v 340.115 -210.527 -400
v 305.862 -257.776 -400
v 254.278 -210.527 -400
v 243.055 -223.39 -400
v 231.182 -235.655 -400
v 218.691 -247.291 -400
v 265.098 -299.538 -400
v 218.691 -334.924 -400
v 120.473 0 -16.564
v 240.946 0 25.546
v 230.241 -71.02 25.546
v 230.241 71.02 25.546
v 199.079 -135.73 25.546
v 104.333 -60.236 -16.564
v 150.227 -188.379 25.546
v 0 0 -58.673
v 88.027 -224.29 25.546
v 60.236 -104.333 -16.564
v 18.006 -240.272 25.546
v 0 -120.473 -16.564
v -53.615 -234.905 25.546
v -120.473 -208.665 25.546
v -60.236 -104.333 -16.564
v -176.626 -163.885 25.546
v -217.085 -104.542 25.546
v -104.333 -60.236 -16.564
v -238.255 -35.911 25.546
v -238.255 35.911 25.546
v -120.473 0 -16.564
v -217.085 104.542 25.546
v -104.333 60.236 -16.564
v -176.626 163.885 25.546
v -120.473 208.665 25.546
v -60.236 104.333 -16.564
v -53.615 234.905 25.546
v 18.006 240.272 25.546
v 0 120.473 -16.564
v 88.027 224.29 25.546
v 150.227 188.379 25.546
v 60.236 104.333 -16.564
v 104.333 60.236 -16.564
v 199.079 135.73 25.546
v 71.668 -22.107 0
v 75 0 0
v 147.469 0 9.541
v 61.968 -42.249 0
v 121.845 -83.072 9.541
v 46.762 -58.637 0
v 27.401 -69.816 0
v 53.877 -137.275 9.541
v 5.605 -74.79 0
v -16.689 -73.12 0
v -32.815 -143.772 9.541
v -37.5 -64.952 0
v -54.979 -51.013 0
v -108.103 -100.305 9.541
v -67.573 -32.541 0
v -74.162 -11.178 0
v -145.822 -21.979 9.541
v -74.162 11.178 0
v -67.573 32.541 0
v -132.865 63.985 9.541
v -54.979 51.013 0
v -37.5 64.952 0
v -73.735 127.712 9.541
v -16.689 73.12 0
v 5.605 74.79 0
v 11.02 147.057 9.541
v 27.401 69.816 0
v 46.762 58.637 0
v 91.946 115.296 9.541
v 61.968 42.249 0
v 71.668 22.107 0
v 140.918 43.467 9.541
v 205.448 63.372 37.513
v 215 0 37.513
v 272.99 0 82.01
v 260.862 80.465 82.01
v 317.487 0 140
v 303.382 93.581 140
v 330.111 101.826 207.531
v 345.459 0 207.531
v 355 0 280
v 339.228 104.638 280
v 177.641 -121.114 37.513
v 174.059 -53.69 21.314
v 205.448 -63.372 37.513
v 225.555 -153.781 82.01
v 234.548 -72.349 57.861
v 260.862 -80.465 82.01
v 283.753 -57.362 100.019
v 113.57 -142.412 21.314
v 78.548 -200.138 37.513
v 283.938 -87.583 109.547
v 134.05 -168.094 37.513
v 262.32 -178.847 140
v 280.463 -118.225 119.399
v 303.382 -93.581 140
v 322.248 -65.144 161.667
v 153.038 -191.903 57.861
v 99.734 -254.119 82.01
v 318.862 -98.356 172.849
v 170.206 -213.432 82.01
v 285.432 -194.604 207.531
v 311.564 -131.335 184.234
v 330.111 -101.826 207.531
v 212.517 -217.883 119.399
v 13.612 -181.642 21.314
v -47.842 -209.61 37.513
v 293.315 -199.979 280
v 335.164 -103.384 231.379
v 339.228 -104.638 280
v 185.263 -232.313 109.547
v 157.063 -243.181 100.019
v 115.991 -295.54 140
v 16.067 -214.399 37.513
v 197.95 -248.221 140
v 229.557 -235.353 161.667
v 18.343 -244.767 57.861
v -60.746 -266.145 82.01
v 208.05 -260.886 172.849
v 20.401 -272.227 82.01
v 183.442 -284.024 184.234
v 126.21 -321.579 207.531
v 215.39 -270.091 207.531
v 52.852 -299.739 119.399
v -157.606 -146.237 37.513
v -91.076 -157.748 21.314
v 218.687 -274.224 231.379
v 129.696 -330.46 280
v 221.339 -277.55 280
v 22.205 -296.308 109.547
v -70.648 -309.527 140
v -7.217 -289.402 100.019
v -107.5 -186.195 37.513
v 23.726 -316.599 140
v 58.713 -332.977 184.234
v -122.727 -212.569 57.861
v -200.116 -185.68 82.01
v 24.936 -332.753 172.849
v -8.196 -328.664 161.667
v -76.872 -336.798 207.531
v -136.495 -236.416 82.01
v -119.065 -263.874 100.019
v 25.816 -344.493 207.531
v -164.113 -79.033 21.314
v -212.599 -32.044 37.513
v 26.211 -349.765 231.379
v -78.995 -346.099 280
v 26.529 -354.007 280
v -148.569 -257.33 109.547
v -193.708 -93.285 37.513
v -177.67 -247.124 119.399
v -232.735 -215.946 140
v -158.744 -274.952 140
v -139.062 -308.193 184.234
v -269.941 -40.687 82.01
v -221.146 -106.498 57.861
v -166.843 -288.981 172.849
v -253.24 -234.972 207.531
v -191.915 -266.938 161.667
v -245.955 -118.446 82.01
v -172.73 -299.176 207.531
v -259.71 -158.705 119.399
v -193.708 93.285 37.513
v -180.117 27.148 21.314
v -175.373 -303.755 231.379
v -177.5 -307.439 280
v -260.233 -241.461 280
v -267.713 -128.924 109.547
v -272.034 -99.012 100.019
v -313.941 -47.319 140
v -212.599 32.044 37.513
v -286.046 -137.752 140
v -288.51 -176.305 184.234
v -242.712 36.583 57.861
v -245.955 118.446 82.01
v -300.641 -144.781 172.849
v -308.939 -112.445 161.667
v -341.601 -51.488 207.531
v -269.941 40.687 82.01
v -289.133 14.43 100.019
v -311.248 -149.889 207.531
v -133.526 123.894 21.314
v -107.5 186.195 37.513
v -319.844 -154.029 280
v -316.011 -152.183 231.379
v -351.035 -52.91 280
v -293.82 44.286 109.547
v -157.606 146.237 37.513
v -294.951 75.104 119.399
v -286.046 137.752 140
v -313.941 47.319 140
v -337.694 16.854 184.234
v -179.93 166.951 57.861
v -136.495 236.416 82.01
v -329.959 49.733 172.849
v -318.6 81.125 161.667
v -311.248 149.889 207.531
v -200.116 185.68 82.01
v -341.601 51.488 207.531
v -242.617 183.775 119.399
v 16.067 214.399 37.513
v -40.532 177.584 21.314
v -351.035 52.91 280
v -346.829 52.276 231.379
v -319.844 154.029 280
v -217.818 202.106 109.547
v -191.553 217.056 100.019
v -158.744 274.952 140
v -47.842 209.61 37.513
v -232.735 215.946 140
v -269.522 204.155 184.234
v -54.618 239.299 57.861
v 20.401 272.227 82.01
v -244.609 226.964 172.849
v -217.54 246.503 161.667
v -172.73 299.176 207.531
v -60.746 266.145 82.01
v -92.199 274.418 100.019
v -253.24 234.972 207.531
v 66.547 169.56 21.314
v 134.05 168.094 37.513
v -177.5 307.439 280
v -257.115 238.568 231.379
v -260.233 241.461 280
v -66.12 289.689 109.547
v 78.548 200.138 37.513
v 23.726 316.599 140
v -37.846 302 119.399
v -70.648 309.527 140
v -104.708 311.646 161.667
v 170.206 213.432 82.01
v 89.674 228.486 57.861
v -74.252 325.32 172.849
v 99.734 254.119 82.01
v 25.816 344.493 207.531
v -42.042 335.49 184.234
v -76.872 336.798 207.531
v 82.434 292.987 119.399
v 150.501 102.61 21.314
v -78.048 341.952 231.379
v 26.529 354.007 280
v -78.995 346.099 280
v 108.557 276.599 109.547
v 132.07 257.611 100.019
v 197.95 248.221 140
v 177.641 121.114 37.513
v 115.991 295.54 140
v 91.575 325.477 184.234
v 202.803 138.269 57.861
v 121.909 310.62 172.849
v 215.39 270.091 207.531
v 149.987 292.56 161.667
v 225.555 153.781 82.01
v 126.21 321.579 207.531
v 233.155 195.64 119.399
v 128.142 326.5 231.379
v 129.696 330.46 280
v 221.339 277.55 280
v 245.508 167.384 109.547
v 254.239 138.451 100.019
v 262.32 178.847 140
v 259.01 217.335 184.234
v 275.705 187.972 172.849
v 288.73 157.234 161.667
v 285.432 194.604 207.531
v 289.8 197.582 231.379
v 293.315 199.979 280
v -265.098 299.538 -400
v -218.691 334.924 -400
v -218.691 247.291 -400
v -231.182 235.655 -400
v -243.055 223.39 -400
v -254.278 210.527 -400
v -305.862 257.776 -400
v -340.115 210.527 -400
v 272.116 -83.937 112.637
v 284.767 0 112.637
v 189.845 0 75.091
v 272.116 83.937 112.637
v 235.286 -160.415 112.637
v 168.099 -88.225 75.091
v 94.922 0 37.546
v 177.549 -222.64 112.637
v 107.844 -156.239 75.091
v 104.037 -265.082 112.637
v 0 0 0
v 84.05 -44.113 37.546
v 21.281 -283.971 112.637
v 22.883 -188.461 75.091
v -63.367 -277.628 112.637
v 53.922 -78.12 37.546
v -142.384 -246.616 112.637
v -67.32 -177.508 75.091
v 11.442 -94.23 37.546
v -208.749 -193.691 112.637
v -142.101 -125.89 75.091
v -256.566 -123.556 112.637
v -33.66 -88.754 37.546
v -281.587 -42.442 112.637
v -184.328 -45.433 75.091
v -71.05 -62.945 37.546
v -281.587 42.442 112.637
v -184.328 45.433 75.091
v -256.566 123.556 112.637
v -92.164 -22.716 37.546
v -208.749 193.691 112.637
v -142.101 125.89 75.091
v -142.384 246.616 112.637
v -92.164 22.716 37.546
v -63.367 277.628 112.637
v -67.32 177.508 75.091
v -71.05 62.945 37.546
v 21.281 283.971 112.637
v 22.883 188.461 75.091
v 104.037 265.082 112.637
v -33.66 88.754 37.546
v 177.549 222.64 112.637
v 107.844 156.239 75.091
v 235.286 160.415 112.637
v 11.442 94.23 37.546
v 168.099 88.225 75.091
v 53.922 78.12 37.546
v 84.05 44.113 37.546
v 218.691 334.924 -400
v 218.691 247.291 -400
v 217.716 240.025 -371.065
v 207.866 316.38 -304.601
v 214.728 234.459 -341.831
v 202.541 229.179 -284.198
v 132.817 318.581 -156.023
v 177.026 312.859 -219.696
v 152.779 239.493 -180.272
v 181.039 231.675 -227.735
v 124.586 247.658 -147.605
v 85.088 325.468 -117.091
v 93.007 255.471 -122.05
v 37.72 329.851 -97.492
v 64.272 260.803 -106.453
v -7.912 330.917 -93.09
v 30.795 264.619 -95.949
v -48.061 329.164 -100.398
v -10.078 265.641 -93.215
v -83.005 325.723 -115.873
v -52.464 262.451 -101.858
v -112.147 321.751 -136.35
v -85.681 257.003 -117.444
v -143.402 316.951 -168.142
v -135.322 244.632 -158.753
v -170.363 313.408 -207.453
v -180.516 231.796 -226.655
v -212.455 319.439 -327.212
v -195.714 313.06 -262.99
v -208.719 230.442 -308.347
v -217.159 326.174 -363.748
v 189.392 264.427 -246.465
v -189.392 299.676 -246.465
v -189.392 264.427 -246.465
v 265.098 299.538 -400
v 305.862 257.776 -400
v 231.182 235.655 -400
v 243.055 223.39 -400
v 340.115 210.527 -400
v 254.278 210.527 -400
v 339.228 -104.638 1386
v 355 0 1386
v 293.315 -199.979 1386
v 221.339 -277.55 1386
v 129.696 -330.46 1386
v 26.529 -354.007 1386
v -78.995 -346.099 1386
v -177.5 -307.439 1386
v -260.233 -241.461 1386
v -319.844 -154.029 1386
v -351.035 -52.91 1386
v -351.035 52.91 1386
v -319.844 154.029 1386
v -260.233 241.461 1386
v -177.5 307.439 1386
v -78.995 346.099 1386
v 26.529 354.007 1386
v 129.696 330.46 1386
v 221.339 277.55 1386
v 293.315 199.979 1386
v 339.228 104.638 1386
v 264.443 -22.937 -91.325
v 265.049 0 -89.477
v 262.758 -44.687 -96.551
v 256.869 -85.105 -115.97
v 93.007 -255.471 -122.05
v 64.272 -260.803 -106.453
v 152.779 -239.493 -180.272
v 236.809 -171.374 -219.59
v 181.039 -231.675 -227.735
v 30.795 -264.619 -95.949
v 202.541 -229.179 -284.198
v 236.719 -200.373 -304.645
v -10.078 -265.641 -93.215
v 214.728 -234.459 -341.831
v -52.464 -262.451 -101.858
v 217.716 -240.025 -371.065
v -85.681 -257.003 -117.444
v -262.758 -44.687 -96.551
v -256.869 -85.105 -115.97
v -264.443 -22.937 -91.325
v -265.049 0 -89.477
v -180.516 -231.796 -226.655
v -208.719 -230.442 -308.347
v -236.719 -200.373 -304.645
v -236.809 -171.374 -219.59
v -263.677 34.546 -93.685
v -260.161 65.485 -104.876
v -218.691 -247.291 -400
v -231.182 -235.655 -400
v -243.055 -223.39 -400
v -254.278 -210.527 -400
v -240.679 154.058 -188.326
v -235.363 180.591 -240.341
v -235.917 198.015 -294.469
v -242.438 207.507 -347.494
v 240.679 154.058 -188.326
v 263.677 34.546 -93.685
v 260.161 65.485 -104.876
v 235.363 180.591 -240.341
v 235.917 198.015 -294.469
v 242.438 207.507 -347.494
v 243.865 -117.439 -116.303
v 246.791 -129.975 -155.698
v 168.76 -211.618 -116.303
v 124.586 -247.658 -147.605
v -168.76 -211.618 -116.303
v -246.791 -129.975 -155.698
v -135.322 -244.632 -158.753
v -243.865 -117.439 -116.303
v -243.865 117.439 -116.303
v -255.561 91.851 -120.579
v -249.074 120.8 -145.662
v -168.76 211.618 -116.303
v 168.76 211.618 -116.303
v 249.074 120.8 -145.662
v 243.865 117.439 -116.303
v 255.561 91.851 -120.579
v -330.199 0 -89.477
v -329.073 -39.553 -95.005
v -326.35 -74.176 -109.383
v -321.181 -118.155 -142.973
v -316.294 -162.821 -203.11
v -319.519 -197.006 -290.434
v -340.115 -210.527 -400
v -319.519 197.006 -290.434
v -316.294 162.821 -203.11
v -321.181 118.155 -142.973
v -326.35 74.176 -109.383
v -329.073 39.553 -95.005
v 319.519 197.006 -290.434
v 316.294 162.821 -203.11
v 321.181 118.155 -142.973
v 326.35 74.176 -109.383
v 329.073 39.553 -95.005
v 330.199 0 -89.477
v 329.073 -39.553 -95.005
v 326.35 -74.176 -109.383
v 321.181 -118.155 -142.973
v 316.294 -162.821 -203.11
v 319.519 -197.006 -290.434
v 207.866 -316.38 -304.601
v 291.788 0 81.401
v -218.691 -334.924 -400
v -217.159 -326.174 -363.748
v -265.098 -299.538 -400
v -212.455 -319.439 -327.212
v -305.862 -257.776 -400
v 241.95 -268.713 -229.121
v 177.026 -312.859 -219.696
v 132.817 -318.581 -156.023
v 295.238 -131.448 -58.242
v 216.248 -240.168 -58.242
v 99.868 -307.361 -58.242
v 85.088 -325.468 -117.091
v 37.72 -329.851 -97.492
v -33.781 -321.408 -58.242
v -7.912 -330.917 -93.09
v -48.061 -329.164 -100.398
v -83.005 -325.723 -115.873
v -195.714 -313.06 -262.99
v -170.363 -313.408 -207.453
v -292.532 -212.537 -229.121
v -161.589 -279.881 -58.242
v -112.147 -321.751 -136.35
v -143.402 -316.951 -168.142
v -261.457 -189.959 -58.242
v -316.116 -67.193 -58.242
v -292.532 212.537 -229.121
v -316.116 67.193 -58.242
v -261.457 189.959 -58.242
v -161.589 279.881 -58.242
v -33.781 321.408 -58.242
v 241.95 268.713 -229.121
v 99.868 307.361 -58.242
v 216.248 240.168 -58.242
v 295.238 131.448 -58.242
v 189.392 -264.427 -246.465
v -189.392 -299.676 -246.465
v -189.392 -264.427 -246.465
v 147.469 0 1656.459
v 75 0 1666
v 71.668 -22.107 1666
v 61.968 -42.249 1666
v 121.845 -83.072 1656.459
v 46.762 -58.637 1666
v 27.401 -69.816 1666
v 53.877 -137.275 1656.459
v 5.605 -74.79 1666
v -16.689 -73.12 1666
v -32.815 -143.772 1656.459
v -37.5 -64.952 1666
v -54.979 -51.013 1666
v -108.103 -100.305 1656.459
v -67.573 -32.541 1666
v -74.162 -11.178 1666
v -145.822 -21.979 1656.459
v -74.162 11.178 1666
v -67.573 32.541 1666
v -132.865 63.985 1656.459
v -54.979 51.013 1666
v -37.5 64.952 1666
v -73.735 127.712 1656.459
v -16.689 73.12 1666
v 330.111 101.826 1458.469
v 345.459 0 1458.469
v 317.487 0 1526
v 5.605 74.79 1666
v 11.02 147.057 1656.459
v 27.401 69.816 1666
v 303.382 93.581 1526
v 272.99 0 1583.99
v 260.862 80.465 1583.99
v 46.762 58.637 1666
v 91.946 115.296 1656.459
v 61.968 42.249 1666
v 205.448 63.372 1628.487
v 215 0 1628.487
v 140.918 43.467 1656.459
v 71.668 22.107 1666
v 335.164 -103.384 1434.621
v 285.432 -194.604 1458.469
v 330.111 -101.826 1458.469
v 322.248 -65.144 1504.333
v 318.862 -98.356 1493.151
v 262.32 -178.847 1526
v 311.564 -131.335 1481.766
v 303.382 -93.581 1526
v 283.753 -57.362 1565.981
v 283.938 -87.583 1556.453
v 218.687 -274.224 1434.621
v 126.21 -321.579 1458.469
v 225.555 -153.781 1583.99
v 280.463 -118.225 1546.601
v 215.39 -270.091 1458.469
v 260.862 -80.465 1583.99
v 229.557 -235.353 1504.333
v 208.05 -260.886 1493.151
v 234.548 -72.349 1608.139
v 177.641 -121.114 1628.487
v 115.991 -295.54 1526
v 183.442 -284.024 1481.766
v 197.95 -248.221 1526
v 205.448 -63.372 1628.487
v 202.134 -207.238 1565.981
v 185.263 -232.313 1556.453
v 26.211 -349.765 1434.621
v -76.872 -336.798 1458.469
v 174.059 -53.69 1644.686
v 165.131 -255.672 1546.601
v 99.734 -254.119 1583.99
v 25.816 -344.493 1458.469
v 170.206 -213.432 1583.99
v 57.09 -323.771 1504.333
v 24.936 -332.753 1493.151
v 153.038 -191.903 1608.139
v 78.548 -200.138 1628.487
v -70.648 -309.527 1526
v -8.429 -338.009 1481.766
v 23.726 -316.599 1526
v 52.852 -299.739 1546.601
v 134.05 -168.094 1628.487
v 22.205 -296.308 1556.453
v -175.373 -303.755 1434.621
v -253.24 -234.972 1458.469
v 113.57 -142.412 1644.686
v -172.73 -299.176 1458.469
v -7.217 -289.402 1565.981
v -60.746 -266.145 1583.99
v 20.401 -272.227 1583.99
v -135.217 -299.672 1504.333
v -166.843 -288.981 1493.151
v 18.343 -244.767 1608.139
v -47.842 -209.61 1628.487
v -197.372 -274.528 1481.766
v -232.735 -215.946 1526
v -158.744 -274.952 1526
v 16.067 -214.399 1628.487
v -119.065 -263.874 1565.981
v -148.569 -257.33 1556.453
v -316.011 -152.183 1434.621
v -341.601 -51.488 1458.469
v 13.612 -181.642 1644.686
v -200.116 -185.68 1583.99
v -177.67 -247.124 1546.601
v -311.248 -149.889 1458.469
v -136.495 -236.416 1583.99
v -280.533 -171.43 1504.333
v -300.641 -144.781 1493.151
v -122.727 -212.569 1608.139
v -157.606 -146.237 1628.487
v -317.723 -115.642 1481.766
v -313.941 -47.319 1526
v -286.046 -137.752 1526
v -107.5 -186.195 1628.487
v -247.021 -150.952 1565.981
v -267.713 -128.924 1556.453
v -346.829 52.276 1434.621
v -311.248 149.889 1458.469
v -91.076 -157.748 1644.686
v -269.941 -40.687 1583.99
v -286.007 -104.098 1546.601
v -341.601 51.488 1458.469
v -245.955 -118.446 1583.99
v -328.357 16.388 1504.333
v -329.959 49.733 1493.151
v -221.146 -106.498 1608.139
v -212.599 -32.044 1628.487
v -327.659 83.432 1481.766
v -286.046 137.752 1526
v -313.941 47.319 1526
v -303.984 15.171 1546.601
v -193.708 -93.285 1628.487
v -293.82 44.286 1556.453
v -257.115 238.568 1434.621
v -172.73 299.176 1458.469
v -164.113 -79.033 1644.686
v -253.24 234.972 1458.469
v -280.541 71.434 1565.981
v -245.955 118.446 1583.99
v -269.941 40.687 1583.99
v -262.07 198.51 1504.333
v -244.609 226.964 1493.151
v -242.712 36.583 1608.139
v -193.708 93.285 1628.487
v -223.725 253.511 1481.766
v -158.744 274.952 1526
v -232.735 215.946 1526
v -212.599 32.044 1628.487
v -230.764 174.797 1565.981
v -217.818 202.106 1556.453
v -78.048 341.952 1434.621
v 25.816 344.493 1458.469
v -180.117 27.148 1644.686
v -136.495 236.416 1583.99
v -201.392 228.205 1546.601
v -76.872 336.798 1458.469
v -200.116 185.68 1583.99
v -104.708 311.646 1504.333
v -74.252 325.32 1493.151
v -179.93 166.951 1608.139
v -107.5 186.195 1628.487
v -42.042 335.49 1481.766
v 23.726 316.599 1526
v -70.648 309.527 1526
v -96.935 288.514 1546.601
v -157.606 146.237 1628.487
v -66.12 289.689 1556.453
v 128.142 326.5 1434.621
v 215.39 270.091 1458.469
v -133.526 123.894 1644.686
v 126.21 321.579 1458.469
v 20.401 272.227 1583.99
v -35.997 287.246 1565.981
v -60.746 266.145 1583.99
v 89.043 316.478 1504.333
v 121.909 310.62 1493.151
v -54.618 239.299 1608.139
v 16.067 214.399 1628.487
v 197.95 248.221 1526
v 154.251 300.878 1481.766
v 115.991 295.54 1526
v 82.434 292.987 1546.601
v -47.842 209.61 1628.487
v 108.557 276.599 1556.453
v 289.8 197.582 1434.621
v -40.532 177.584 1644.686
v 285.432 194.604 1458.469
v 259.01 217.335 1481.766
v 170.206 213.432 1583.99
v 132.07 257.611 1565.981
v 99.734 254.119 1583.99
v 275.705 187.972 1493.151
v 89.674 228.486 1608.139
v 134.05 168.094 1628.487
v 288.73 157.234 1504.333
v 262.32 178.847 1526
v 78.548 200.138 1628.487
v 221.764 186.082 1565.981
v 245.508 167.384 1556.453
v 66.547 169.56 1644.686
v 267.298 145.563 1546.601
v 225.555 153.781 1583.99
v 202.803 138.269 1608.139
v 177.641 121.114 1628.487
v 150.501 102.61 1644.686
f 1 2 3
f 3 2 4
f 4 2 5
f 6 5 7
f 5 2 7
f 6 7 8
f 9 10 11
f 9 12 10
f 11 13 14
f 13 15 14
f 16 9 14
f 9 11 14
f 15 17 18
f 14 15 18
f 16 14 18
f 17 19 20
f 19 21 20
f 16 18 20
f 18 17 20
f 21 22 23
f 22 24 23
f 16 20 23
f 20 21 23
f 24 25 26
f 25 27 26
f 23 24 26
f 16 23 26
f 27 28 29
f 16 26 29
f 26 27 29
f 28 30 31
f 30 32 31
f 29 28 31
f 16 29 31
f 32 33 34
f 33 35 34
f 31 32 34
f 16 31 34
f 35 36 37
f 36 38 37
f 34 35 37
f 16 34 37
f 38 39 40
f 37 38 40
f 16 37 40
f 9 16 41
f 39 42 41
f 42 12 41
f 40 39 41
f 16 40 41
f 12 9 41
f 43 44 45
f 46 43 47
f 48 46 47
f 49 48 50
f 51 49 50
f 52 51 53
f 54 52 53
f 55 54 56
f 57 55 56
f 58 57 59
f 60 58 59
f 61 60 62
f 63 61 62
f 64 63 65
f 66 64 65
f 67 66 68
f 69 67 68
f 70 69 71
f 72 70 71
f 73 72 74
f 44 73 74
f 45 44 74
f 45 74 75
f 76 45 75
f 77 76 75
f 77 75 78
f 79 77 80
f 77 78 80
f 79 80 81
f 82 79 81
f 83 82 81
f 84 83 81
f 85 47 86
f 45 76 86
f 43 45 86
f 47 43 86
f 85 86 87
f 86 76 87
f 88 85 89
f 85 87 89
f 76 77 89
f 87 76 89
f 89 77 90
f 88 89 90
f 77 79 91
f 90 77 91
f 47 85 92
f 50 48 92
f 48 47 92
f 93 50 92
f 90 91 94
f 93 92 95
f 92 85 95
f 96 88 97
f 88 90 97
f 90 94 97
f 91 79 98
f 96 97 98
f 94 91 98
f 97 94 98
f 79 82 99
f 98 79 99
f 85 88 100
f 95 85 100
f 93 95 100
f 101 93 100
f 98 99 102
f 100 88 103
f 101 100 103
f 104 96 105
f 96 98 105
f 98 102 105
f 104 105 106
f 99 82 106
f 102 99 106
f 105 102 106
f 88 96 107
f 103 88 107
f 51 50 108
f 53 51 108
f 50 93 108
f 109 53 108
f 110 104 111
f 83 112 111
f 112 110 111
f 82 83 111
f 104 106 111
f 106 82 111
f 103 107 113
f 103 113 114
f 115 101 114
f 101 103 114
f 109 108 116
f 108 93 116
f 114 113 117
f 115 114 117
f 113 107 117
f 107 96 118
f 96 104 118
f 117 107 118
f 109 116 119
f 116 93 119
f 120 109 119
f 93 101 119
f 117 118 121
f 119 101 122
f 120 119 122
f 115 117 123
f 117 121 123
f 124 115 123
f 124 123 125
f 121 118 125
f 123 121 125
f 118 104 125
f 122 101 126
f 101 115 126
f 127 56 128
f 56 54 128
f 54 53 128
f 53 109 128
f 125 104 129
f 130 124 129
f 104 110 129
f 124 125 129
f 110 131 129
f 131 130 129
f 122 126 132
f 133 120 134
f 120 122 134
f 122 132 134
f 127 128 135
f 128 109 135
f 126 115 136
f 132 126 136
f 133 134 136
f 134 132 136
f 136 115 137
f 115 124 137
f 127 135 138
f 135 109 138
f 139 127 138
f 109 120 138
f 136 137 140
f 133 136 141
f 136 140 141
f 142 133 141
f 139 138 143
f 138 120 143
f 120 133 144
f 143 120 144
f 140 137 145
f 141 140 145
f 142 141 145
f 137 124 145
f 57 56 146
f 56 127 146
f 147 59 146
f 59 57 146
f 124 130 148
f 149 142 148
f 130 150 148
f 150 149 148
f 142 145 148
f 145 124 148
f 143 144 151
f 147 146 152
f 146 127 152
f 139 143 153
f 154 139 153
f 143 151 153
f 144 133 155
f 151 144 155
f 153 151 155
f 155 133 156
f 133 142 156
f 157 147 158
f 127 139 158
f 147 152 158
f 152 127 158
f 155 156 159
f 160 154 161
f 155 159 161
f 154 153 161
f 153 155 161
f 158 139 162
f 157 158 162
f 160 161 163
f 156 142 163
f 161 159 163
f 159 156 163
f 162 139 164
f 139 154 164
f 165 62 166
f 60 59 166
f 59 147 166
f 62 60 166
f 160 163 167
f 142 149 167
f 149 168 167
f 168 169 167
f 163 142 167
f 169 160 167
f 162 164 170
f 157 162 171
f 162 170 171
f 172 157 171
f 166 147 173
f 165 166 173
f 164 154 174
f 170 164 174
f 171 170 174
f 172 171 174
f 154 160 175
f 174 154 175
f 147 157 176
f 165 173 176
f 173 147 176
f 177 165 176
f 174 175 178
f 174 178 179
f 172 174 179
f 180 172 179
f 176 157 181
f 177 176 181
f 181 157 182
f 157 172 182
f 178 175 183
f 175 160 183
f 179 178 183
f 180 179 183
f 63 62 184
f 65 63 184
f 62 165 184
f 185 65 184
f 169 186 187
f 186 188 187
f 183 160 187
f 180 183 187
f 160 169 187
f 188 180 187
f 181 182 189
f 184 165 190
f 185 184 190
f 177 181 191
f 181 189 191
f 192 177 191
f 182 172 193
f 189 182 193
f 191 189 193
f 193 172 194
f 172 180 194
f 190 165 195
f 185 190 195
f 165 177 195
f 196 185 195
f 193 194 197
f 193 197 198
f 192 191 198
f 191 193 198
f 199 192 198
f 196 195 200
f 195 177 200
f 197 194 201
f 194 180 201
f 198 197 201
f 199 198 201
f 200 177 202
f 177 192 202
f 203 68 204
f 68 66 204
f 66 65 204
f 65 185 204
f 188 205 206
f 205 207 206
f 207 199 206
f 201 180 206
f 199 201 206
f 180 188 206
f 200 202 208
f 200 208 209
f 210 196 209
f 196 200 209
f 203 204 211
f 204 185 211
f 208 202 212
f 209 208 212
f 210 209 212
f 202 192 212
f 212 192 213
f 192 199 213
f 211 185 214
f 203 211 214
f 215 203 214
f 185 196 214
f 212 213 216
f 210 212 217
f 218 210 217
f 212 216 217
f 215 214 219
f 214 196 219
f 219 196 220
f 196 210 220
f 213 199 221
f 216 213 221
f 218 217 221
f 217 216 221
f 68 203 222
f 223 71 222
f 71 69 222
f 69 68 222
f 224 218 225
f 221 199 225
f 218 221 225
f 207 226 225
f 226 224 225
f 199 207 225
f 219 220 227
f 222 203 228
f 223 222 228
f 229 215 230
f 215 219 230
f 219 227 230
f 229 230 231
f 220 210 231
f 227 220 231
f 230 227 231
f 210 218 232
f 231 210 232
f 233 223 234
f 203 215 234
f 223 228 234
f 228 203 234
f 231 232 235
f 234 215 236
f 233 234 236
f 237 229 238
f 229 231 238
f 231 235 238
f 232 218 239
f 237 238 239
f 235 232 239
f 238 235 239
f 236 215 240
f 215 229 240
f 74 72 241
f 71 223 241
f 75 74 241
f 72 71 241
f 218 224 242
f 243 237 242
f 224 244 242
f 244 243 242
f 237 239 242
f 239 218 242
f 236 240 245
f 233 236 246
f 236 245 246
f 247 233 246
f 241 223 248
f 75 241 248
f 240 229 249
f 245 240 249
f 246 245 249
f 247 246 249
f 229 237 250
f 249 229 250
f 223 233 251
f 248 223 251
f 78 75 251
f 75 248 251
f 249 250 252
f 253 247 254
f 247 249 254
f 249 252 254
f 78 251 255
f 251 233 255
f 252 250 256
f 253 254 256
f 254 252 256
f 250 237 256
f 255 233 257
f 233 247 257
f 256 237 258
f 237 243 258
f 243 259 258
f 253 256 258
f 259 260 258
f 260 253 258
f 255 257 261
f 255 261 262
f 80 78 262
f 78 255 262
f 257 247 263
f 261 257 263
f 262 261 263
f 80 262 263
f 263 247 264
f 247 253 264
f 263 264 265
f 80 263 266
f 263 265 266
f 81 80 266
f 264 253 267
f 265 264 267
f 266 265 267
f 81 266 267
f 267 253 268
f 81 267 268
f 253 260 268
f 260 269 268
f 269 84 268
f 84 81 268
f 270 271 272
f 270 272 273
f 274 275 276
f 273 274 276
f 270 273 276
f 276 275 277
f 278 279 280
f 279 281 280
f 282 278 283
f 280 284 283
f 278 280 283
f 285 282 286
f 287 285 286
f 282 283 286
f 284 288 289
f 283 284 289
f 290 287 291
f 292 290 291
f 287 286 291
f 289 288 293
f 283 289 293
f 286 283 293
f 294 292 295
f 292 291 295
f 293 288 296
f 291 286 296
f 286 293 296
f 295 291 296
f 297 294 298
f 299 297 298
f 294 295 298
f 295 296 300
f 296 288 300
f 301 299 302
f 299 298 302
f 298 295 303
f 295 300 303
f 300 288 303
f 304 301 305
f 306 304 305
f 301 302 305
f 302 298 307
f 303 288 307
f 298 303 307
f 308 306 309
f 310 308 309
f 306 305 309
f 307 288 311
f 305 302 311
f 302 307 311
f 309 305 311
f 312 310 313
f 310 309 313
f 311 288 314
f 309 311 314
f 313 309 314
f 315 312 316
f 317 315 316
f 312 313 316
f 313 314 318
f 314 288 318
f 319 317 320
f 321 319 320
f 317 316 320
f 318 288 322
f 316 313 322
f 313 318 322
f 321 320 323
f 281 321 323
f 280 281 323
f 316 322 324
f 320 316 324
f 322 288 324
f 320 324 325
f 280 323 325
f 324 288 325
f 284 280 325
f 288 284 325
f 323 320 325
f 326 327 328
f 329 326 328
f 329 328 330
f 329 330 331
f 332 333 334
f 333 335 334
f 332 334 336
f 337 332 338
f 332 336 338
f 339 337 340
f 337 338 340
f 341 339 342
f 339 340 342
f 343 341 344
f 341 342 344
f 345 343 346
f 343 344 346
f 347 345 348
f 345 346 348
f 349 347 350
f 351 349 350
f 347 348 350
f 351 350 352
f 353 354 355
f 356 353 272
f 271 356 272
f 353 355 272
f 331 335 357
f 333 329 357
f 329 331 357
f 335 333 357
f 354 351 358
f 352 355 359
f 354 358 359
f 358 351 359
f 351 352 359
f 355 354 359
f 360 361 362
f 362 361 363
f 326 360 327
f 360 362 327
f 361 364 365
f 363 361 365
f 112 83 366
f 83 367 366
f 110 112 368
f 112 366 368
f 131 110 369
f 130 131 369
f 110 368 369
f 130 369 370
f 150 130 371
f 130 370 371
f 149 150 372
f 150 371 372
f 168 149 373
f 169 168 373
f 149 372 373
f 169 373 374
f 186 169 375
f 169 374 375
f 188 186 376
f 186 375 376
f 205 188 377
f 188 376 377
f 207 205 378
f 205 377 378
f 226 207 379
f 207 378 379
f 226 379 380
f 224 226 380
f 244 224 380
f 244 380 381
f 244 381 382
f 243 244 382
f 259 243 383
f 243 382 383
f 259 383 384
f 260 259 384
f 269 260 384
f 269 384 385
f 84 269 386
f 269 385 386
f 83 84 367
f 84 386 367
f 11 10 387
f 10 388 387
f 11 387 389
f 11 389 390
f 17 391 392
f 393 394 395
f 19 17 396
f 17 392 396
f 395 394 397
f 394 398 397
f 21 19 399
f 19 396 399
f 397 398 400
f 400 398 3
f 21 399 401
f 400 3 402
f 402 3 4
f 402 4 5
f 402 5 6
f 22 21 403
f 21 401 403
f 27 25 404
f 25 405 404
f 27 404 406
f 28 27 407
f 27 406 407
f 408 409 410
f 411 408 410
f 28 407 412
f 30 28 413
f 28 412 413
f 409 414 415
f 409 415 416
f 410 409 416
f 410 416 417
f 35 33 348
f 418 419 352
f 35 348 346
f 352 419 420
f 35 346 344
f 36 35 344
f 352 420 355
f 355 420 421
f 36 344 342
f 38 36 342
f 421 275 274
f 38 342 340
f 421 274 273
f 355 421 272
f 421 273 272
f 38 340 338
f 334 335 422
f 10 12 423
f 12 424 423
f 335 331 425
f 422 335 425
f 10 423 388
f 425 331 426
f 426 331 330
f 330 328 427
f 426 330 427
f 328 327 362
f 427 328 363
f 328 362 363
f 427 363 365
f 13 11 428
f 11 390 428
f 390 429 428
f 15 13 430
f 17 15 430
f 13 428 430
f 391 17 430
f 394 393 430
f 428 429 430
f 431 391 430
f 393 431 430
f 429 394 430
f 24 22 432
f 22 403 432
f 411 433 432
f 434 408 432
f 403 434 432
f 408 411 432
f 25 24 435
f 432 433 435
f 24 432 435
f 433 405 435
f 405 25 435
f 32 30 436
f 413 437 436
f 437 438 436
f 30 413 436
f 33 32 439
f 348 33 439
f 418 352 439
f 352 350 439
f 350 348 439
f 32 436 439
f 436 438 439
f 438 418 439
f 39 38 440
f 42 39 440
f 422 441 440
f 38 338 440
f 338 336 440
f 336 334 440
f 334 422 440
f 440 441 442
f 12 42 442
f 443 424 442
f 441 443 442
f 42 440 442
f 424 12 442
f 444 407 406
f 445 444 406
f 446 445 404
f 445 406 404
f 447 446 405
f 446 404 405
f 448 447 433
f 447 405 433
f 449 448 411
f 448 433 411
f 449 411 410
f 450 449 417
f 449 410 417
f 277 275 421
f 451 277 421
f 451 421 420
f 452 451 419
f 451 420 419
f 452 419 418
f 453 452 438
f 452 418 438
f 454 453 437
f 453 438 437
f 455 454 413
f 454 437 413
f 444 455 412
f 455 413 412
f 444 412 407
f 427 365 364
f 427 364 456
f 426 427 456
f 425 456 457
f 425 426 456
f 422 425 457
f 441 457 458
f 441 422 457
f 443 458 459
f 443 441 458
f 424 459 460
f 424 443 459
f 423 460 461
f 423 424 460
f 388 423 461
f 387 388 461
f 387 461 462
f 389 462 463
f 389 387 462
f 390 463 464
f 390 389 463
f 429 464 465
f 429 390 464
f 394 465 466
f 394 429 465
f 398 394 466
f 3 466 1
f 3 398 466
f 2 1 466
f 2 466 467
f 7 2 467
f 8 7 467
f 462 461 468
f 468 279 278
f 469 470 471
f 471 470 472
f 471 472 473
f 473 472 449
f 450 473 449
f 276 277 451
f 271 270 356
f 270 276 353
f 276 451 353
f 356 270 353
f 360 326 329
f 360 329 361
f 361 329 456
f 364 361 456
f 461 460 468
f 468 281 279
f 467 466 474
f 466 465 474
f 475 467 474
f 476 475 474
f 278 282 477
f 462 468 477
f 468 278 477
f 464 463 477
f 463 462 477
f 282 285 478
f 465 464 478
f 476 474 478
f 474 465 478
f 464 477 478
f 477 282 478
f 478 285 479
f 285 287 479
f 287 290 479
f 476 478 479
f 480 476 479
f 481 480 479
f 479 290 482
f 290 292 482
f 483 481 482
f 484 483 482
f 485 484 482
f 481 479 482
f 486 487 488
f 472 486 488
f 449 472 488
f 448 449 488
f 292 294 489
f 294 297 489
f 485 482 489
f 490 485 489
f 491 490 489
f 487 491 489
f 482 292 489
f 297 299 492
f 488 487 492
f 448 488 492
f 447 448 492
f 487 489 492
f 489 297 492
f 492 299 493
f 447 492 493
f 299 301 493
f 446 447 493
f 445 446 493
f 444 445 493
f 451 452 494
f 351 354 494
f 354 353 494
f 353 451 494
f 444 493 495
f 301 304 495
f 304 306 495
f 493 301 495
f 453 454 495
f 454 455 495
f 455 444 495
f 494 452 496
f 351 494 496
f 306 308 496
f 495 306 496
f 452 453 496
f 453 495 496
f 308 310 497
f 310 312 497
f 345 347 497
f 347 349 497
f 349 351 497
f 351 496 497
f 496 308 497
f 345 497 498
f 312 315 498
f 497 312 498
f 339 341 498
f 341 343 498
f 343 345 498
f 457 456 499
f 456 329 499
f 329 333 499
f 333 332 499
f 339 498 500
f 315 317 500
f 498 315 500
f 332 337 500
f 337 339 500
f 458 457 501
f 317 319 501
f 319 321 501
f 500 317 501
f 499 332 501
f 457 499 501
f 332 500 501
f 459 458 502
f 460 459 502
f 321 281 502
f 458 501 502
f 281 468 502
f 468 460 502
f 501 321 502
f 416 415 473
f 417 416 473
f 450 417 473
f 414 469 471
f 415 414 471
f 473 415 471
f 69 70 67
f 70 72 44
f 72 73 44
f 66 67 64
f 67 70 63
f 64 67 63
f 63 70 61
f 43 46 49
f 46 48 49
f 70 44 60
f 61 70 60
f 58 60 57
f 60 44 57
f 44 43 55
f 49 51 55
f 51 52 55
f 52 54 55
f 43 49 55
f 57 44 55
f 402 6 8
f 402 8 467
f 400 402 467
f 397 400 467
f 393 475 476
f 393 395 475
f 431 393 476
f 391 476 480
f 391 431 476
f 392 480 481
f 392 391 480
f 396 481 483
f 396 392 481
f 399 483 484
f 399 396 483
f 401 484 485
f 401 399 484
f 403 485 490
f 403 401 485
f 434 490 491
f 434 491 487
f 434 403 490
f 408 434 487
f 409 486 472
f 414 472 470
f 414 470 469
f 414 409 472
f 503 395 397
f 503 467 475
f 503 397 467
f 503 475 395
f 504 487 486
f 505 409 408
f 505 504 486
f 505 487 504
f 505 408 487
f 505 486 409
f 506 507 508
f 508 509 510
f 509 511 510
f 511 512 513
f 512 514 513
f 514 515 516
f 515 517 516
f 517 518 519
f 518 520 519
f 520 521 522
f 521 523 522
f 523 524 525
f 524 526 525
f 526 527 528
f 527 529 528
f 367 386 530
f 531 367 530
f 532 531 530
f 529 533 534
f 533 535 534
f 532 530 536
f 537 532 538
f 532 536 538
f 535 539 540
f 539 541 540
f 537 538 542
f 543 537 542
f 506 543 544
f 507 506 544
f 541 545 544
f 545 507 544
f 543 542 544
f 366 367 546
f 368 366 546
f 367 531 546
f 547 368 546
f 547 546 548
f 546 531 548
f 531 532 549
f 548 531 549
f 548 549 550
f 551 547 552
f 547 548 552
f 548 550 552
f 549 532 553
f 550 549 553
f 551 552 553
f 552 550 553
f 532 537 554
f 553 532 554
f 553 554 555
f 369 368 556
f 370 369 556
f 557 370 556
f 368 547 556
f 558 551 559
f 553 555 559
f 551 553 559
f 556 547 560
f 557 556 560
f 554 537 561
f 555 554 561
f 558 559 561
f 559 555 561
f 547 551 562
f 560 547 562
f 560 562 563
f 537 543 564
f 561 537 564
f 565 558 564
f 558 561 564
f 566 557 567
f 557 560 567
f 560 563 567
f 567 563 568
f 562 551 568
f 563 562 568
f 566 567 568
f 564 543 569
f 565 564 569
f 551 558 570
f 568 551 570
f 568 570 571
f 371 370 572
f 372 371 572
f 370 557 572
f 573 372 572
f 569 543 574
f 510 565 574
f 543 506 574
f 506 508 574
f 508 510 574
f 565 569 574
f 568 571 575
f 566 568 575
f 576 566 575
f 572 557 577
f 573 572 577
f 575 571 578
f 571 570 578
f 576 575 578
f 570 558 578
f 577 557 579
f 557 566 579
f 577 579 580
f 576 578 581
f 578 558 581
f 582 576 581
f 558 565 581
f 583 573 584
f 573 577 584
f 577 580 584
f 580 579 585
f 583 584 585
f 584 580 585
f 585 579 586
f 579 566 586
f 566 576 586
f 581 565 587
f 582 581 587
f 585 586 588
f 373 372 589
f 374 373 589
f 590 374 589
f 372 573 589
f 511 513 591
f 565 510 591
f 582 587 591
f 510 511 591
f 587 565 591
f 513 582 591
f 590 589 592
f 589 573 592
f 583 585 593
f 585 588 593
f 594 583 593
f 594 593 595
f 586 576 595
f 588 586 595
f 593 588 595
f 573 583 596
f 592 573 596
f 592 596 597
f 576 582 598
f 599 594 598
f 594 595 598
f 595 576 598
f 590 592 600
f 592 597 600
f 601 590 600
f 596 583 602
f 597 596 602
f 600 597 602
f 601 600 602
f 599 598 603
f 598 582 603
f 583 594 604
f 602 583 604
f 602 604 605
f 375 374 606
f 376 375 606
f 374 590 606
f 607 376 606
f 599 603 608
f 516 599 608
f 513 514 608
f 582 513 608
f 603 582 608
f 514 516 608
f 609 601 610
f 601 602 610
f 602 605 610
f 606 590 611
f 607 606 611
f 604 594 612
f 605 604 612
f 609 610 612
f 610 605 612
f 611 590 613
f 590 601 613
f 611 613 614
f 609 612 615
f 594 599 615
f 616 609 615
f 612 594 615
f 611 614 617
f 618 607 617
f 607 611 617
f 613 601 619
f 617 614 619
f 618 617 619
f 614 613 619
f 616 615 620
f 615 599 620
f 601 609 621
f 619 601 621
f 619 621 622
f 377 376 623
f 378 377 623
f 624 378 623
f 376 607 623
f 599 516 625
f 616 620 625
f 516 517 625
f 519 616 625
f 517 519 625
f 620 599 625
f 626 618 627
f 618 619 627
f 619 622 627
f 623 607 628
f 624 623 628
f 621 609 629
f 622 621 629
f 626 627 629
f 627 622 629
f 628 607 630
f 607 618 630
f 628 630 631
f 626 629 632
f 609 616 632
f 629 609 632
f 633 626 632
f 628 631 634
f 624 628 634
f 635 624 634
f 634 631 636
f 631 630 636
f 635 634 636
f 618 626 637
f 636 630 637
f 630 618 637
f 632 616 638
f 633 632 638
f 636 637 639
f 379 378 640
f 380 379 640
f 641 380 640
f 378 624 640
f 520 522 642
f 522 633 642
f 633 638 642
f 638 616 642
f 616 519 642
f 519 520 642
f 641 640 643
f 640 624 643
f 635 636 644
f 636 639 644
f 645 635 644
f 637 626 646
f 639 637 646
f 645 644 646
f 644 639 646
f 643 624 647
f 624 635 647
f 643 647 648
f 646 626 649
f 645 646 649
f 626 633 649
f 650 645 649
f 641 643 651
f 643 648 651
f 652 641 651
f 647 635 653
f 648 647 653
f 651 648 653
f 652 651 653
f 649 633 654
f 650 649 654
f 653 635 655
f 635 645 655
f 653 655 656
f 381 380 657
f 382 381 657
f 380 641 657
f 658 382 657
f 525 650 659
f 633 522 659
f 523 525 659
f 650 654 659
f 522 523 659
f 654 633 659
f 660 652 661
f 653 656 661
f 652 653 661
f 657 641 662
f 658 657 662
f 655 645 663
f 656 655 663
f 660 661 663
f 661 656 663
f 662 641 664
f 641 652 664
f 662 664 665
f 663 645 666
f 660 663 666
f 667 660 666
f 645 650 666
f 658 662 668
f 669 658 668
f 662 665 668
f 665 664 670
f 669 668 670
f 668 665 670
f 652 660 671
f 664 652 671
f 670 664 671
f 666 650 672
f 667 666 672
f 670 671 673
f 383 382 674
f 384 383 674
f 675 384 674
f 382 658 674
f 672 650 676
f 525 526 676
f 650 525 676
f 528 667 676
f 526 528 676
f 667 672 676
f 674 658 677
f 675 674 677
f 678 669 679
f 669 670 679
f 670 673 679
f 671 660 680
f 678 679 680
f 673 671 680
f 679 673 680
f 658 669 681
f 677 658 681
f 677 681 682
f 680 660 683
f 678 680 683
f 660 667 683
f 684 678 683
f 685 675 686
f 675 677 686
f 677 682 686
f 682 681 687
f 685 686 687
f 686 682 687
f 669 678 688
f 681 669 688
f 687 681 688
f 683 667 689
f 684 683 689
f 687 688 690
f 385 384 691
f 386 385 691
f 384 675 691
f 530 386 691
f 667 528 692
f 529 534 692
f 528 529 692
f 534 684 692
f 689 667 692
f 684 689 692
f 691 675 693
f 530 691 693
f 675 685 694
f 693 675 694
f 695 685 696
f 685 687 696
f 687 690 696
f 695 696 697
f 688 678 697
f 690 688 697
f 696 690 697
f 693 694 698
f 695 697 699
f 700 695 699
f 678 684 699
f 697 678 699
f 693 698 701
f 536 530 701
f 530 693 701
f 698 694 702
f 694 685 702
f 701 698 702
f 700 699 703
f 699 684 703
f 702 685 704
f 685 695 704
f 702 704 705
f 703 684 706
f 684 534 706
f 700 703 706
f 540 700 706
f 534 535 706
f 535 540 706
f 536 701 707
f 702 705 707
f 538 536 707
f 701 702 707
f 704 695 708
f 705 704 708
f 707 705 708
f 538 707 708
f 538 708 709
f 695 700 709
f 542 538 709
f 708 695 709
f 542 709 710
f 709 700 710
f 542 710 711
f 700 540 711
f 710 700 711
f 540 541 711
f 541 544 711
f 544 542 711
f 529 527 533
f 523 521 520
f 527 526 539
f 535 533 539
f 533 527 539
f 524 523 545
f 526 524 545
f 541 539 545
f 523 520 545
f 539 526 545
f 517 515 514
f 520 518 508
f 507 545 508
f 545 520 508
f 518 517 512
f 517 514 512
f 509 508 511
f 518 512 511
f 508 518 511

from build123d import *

# Parameters (mm, degrees)
F5_DEPTH = 400
F7_DEPTH = 400


with BuildPart() as f1:
    # F0 (on Front) → F1 (revolve)
    with BuildSketch(Plane.XZ):
        with BuildLine():
            Line((0, 1666), (0, 0))
            Line((0, 0), (75, 0))
            ThreePointArc((75, 0), (272.989899, 82.010101), (355, 280))
            Line((355, 280), (355, 1386))
            ThreePointArc((355, 1386), (272.989899, 1583.989899), (75, 1666))
            Line((75, 1666), (0, 1666))
        make_face()
    revolve(axis=Axis((0, 0, 833), (0, 0, -1)))


with BuildPart() as f3:
    # F2 (on Front) → F3 (revolve)
    with BuildSketch(Plane.XZ):
        Polygon((284.76727, 112.636521), (0, 0), (0, -58.67311), (240.945756, 25.545988), (330.118984, -400), (400, -400), align=None)
    revolve(axis=Axis((0, 0, -29.336555), (0, 0, -1)))

    # F4 (on Front) → F5 (cut, symmetric)
    with BuildSketch(Plane.XZ):
        with BuildLine():
            add(Edge.make_bspline(
                [(0, -707.192779), (378.78419, -707.192779), (189.392095, -246.464729), (0, 214.26332), (-189.392095, -246.464729), (-378.78419, -707.192779), (0, -707.192779)],
                knots=[0, 0, 0, 2.094395, 2.094395, 4.18879, 4.18879, 6.283185, 6.283185, 6.283185], degree=2, weights=[1, 0.5, 1, 0.5, 1, 0.5, 1]))
        make_face()
    extrude(amount=F5_DEPTH, both=True, mode=Mode.SUBTRACT)

    # F6 (on Right) → F7 (cut, symmetric)
    with BuildSketch(Plane.YZ):
        with BuildLine():
            add(Edge.make_bspline(
                [(0, -89.477435), (-364.642988, -89.477435), (-182.321494, -555.083461), (0, -1020.689487), (182.321494, -555.083461), (364.642988, -89.477435), (0, -89.477435)],
                knots=[0, 0, 0, 2.094395, 2.094395, 4.18879, 4.18879, 6.283185, 6.283185, 6.283185], degree=2, weights=[1, 0.5, 1, 0.5, 1, 0.5, 1]))
        make_face()
    extrude(amount=F7_DEPTH, both=True, mode=Mode.SUBTRACT)


solid = Compound([f1.part, f3.part])
